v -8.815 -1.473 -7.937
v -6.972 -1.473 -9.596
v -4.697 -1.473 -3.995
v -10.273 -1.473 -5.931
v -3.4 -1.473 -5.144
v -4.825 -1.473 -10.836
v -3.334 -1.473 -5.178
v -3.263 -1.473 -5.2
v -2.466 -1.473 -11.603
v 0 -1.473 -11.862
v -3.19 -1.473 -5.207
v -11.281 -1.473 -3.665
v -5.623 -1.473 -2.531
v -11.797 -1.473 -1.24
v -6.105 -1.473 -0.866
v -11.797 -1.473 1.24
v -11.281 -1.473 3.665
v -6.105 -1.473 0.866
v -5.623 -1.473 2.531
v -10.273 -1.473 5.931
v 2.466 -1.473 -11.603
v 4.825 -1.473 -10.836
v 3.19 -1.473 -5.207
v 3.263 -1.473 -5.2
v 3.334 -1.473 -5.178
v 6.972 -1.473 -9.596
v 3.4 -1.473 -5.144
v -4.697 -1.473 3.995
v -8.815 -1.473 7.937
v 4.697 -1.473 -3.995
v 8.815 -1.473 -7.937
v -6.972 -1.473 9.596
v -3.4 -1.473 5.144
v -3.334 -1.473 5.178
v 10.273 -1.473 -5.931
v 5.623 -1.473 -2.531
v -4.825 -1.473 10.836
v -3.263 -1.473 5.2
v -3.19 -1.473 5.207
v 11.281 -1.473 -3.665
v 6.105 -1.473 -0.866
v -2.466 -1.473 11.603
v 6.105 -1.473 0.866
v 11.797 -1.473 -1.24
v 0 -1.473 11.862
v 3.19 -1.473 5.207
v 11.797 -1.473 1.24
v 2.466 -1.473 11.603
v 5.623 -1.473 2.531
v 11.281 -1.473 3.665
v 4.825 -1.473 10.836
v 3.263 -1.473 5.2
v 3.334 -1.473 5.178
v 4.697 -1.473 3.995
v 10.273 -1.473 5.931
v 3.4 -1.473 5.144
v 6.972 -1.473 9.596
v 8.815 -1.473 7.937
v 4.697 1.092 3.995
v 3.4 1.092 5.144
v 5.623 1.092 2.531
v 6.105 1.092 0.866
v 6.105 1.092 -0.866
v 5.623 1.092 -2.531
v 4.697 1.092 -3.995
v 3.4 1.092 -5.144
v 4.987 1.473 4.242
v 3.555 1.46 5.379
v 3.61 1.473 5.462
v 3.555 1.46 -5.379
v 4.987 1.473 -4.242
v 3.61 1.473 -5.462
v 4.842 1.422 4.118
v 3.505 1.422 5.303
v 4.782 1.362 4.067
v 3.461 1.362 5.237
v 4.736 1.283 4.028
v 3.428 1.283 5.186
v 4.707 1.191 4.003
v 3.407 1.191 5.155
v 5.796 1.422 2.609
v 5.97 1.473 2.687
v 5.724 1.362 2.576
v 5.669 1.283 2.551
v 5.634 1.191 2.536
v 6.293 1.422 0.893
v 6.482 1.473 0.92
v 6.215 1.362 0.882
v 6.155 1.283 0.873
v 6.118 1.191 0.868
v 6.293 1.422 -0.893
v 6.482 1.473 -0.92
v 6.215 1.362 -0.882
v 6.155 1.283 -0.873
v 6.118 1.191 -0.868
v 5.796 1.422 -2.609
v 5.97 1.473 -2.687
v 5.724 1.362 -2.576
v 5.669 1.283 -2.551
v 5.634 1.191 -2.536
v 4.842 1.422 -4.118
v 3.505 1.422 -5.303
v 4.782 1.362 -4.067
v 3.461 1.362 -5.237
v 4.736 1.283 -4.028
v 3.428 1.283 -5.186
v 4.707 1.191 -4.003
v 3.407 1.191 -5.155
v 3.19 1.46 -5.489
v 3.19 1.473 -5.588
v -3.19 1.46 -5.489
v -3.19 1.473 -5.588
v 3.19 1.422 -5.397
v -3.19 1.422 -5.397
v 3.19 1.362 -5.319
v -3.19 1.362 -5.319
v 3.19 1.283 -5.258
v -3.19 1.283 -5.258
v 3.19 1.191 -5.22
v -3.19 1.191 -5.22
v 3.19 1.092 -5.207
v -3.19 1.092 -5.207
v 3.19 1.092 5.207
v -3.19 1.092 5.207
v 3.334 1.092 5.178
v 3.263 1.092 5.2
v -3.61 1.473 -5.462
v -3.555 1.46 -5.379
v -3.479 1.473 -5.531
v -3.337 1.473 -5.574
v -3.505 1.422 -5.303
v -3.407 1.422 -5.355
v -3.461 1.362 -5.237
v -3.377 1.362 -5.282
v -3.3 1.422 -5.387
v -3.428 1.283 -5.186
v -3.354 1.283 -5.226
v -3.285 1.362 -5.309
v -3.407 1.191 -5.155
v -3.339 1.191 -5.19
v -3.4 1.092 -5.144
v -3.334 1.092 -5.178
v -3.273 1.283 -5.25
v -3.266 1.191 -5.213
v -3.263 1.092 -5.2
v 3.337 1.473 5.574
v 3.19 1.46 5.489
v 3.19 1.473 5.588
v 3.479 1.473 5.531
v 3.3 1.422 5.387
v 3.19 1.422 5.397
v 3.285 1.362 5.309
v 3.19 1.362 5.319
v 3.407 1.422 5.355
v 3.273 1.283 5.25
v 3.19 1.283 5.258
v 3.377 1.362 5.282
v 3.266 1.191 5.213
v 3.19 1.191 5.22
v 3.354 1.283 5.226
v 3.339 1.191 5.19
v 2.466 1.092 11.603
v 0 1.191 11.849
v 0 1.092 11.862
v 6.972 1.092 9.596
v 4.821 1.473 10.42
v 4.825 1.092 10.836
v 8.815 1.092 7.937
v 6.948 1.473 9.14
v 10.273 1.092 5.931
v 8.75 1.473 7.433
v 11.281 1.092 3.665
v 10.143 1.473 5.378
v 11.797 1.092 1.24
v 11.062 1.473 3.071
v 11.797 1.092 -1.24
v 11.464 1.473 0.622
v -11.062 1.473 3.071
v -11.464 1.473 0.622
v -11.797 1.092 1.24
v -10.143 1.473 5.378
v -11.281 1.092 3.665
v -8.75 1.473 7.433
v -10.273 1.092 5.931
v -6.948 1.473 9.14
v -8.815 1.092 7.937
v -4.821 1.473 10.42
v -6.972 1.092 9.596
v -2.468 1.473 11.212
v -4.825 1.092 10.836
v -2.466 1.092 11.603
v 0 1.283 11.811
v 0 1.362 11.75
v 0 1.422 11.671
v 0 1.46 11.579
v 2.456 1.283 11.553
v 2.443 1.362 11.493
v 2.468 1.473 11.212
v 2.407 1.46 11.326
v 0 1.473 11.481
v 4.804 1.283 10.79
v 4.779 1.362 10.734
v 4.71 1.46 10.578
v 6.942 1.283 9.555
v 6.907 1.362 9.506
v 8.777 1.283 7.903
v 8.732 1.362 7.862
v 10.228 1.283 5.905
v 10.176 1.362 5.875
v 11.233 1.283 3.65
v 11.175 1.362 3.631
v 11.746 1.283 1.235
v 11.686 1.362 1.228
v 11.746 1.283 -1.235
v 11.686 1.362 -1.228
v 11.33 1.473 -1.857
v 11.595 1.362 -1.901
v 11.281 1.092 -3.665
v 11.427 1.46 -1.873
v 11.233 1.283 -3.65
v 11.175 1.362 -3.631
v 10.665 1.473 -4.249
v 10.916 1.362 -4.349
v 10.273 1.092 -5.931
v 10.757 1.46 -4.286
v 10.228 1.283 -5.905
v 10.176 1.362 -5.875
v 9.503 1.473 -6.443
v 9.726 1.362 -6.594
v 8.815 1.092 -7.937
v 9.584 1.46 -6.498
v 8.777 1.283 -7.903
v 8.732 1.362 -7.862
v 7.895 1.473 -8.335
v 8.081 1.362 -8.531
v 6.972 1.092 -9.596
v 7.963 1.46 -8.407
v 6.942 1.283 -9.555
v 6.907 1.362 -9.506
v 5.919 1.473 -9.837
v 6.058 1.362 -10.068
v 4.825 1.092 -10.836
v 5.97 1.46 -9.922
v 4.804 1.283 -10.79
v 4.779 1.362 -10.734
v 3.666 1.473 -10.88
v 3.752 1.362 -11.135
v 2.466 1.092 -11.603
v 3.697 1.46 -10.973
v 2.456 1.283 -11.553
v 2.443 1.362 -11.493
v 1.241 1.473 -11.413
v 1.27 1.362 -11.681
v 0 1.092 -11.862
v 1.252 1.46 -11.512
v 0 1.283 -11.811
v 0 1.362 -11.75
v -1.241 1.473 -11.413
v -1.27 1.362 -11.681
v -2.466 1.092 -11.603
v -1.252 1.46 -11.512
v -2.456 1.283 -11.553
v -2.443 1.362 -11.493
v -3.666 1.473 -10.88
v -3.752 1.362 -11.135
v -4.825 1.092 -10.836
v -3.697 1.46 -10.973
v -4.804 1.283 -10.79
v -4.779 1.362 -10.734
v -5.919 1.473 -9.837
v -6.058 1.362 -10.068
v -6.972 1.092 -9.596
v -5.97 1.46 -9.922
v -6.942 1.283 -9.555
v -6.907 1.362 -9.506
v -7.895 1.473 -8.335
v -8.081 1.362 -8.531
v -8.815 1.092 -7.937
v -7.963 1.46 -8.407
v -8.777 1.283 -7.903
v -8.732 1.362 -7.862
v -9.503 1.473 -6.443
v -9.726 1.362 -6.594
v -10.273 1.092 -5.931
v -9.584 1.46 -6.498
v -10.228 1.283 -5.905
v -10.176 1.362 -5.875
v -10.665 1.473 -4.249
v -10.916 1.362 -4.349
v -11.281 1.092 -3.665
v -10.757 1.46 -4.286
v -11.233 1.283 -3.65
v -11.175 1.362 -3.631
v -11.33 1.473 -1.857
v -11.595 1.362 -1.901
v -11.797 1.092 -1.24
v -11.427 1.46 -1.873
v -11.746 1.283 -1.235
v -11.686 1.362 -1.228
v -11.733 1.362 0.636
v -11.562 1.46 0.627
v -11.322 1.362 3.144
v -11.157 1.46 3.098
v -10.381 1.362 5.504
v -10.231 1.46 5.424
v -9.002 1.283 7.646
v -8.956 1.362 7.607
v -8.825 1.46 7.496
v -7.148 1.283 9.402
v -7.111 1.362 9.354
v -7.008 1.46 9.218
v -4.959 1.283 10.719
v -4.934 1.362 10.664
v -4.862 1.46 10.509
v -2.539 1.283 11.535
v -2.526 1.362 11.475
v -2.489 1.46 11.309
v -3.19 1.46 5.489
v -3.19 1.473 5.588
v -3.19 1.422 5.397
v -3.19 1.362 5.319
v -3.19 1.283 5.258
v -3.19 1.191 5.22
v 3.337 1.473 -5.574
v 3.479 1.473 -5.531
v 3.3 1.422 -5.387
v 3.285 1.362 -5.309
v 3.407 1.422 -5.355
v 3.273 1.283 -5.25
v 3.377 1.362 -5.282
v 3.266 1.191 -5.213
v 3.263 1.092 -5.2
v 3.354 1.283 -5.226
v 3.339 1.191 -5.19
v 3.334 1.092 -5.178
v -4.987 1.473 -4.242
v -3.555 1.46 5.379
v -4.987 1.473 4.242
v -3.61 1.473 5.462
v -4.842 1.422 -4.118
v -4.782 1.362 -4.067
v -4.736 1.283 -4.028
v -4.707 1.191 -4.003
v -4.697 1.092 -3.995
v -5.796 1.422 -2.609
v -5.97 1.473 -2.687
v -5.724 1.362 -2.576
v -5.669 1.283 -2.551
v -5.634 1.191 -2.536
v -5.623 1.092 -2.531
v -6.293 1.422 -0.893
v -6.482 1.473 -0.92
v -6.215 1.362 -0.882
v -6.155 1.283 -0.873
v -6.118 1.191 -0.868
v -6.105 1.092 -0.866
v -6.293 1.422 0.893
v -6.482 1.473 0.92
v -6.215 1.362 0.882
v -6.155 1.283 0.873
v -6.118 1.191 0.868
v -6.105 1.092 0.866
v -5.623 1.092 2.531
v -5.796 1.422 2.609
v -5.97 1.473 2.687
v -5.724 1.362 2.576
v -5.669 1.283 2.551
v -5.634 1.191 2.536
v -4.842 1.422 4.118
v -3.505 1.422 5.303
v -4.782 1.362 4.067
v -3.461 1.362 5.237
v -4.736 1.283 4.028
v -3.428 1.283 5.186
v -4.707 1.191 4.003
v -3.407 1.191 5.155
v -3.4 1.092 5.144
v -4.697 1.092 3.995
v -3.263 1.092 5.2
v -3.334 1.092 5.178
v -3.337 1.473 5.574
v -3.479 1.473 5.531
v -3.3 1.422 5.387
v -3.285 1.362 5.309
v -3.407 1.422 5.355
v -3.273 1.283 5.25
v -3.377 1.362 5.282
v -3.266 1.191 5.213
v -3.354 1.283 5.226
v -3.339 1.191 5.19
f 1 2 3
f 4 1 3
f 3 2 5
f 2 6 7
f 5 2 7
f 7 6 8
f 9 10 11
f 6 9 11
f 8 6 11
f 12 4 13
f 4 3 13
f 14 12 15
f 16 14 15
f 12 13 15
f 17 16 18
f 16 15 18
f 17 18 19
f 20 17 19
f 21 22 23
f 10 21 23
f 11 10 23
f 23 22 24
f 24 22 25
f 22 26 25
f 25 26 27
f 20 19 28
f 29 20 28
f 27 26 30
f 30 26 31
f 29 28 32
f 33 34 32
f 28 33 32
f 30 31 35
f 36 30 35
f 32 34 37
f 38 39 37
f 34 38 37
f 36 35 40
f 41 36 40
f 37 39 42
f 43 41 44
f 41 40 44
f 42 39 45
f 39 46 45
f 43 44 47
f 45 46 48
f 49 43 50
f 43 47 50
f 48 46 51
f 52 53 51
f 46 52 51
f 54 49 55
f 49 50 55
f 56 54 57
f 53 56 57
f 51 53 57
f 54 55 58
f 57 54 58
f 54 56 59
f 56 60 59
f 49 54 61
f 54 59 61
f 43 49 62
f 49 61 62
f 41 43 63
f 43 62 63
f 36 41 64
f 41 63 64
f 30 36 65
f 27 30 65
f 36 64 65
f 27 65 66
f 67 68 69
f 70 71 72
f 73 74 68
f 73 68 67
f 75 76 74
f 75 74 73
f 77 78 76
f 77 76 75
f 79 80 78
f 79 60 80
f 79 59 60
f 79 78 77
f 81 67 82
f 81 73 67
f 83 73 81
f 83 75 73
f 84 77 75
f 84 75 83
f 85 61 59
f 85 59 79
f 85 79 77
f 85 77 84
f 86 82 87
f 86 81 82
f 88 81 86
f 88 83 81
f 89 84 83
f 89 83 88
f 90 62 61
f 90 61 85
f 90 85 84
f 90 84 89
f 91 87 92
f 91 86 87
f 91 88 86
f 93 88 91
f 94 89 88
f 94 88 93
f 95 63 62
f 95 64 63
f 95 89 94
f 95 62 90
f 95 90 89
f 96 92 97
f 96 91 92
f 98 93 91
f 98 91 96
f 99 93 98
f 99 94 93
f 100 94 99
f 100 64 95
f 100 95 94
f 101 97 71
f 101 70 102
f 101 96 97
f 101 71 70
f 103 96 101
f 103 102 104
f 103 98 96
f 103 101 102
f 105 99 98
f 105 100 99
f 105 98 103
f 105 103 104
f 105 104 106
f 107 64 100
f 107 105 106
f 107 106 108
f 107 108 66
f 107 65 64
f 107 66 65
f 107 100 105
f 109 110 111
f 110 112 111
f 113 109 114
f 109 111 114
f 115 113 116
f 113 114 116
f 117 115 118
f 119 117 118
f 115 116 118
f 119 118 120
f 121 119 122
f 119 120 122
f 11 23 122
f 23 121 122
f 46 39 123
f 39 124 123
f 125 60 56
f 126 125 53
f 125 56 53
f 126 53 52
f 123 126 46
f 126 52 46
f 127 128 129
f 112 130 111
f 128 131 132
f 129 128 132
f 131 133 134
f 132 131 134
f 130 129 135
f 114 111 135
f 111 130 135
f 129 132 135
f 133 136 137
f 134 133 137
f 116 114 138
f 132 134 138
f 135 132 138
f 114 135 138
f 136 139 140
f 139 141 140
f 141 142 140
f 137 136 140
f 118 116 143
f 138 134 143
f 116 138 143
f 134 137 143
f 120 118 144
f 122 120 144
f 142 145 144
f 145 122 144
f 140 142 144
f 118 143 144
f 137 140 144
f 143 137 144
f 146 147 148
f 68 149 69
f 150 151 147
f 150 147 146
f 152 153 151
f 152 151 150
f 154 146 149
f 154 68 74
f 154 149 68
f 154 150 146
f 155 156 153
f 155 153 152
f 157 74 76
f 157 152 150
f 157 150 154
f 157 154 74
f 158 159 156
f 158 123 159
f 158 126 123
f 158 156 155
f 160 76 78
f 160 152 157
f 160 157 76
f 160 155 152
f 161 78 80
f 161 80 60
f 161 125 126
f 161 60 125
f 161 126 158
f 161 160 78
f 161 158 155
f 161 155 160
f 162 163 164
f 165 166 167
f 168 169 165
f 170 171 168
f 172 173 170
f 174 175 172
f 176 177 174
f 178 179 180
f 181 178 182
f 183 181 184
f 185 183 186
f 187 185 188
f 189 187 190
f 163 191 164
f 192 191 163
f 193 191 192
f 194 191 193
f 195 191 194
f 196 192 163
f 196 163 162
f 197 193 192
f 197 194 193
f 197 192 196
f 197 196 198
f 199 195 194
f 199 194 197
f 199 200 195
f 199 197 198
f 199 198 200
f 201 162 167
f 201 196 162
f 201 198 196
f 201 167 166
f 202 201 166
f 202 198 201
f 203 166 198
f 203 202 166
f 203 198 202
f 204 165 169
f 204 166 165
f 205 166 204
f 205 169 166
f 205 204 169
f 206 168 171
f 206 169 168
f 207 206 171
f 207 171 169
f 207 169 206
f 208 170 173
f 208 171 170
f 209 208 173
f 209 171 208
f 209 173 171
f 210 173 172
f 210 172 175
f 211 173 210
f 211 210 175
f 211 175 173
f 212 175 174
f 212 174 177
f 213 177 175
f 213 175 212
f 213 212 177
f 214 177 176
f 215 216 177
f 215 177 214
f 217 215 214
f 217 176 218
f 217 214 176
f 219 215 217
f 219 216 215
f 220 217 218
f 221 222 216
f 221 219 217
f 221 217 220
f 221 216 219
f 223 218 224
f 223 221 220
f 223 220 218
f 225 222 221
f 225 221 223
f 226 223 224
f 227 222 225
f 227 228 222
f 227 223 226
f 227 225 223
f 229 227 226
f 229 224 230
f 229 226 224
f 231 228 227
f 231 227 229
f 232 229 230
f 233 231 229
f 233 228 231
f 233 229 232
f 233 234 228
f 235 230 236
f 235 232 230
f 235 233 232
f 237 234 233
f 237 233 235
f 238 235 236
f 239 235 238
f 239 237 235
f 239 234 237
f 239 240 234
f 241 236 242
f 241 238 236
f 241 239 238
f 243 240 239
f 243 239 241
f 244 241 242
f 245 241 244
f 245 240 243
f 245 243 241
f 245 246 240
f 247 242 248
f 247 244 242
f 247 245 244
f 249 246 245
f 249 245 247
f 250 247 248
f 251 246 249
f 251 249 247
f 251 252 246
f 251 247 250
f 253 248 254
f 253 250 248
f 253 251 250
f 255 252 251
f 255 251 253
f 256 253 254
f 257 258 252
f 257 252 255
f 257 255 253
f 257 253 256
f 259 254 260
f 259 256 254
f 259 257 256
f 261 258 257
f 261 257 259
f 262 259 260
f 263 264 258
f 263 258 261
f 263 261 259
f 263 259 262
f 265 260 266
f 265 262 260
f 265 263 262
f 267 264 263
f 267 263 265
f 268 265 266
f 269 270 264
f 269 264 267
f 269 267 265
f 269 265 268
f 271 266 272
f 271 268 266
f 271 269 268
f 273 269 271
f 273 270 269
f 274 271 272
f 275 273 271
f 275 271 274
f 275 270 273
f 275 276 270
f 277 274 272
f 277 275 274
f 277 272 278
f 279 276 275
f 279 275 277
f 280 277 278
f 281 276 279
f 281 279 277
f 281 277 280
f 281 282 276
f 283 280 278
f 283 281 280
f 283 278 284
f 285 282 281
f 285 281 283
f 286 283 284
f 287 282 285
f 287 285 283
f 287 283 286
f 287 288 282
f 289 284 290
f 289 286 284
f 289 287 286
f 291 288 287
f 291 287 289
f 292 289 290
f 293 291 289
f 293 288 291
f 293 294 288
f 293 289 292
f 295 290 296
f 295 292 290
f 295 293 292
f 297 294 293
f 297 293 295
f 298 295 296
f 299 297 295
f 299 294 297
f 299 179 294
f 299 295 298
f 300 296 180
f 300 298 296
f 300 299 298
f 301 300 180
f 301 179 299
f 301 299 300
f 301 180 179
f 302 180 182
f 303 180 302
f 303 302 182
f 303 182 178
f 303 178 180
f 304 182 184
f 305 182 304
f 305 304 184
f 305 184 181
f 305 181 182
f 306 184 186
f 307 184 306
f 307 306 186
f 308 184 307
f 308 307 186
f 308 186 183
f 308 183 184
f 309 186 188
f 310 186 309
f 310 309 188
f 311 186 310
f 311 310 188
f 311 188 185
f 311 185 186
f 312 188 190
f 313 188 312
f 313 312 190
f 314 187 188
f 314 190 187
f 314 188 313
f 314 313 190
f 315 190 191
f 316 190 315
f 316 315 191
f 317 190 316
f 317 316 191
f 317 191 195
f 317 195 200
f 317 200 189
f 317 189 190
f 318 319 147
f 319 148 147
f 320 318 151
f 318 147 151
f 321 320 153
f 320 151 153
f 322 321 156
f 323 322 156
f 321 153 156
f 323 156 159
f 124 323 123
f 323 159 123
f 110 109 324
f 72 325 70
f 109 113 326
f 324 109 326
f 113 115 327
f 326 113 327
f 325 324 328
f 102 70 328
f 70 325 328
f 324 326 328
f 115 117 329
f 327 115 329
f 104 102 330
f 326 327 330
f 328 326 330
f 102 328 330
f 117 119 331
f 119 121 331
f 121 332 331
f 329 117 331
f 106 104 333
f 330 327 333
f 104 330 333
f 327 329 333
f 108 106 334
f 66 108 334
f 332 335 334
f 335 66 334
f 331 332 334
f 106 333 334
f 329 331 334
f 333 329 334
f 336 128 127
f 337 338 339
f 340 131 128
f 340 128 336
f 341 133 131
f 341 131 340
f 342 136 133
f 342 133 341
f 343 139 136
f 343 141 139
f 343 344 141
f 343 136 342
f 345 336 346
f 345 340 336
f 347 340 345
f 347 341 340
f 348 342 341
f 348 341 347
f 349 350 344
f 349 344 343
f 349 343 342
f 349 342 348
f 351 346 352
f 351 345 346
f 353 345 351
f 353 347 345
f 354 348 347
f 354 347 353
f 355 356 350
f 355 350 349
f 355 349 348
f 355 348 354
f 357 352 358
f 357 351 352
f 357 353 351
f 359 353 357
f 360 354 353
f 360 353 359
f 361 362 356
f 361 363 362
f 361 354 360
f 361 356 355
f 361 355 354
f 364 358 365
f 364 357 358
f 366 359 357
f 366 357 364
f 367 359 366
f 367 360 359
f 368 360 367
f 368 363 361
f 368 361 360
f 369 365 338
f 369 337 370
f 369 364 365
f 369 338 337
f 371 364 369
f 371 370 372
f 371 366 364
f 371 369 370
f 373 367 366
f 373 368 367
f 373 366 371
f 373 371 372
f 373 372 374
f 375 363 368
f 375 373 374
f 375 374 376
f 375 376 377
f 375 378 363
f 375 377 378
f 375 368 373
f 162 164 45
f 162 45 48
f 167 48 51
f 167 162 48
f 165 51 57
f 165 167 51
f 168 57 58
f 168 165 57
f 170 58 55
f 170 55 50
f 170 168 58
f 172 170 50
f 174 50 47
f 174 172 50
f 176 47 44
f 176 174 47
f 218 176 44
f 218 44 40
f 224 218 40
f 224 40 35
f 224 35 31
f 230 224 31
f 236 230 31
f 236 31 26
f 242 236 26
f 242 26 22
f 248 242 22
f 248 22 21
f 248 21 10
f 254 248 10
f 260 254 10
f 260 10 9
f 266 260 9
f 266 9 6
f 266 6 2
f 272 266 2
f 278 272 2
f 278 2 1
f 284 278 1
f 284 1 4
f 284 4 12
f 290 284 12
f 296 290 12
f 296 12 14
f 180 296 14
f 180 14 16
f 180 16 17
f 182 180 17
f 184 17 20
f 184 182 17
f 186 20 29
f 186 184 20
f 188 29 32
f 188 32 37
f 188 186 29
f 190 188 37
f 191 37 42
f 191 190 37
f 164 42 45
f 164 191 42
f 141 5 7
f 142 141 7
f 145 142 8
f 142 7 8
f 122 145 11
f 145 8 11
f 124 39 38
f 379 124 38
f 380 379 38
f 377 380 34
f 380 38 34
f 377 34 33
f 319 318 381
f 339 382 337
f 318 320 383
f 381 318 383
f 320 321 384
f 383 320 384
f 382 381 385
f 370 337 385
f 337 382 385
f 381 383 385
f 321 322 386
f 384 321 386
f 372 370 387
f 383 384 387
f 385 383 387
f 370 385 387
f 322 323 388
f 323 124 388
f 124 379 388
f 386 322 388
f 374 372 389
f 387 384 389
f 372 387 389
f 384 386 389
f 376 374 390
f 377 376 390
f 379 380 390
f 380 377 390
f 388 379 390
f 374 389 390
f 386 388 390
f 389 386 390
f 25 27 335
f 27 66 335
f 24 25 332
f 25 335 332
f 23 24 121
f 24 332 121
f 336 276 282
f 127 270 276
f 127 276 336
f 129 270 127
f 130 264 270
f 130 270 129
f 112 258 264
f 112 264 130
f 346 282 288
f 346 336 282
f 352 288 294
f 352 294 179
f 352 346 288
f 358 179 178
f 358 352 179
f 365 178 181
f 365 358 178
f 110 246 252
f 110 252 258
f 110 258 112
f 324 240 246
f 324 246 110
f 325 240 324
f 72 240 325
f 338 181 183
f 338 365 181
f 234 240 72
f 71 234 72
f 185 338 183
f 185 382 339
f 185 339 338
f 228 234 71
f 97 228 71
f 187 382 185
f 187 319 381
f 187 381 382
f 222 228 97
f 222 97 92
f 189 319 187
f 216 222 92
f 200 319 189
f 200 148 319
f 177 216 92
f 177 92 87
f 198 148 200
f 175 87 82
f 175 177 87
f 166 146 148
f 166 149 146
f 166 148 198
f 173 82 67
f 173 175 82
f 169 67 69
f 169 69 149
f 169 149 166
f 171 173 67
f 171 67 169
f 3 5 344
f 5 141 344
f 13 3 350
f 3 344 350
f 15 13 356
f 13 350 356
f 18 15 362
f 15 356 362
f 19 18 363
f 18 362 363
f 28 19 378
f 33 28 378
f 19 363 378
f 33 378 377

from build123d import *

# Parameters (mm, degrees)
SKETCH1_R           = 11.8618
BOSS_EXTRUDE1_DEPTH = 1.4732
FILLET1_R           = 0.381


with BuildPart() as part:
    # Sketch1 → Boss-Extrude1 (new, symmetric)
    with BuildSketch(Plane(origin=(0, 0, 0), x_dir=(1, 0, 0), z_dir=(0, 1, 0))):
        with Locations(Location((0, 0, 0), (0, 0, 270))):
            Circle(SKETCH1_R)
        with BuildLine():
            Line((3.302250327, 5.207), (-3.302250327, 5.207))
            ThreePointArc((-3.302250327, 5.207), (-6.16585, 0), (-3.302250327, -5.207))
            Line((-3.302250327, -5.207), (3.302250327, -5.207))
            ThreePointArc((3.302250327, -5.207), (6.16585, 0), (3.302250327, 5.207))
        make_face(mode=Mode.SUBTRACT)
    extrude(amount=BOSS_EXTRUDE1_DEPTH, both=True)

    # Fillet1
    fillet1_edges = [part.edges().sort_by_distance(p)[0] for p in [
        (3.302250327, 0, -5.207),
        (-3.302250327, 0, -5.207),
        (-3.302250327, 0, 5.207),
        (3.302250327, 0, 5.207),
        (0, 1.4732, 5.207),
        (-6.16585, 1.4732, 0),
        (0, 1.4732, -5.207),
        (0, 1.4732, -11.8618),
        (6.16585, 1.4732, 0),
    ]]
    fillet(fillet1_edges, radius=FILLET1_R)


solid = part.part
